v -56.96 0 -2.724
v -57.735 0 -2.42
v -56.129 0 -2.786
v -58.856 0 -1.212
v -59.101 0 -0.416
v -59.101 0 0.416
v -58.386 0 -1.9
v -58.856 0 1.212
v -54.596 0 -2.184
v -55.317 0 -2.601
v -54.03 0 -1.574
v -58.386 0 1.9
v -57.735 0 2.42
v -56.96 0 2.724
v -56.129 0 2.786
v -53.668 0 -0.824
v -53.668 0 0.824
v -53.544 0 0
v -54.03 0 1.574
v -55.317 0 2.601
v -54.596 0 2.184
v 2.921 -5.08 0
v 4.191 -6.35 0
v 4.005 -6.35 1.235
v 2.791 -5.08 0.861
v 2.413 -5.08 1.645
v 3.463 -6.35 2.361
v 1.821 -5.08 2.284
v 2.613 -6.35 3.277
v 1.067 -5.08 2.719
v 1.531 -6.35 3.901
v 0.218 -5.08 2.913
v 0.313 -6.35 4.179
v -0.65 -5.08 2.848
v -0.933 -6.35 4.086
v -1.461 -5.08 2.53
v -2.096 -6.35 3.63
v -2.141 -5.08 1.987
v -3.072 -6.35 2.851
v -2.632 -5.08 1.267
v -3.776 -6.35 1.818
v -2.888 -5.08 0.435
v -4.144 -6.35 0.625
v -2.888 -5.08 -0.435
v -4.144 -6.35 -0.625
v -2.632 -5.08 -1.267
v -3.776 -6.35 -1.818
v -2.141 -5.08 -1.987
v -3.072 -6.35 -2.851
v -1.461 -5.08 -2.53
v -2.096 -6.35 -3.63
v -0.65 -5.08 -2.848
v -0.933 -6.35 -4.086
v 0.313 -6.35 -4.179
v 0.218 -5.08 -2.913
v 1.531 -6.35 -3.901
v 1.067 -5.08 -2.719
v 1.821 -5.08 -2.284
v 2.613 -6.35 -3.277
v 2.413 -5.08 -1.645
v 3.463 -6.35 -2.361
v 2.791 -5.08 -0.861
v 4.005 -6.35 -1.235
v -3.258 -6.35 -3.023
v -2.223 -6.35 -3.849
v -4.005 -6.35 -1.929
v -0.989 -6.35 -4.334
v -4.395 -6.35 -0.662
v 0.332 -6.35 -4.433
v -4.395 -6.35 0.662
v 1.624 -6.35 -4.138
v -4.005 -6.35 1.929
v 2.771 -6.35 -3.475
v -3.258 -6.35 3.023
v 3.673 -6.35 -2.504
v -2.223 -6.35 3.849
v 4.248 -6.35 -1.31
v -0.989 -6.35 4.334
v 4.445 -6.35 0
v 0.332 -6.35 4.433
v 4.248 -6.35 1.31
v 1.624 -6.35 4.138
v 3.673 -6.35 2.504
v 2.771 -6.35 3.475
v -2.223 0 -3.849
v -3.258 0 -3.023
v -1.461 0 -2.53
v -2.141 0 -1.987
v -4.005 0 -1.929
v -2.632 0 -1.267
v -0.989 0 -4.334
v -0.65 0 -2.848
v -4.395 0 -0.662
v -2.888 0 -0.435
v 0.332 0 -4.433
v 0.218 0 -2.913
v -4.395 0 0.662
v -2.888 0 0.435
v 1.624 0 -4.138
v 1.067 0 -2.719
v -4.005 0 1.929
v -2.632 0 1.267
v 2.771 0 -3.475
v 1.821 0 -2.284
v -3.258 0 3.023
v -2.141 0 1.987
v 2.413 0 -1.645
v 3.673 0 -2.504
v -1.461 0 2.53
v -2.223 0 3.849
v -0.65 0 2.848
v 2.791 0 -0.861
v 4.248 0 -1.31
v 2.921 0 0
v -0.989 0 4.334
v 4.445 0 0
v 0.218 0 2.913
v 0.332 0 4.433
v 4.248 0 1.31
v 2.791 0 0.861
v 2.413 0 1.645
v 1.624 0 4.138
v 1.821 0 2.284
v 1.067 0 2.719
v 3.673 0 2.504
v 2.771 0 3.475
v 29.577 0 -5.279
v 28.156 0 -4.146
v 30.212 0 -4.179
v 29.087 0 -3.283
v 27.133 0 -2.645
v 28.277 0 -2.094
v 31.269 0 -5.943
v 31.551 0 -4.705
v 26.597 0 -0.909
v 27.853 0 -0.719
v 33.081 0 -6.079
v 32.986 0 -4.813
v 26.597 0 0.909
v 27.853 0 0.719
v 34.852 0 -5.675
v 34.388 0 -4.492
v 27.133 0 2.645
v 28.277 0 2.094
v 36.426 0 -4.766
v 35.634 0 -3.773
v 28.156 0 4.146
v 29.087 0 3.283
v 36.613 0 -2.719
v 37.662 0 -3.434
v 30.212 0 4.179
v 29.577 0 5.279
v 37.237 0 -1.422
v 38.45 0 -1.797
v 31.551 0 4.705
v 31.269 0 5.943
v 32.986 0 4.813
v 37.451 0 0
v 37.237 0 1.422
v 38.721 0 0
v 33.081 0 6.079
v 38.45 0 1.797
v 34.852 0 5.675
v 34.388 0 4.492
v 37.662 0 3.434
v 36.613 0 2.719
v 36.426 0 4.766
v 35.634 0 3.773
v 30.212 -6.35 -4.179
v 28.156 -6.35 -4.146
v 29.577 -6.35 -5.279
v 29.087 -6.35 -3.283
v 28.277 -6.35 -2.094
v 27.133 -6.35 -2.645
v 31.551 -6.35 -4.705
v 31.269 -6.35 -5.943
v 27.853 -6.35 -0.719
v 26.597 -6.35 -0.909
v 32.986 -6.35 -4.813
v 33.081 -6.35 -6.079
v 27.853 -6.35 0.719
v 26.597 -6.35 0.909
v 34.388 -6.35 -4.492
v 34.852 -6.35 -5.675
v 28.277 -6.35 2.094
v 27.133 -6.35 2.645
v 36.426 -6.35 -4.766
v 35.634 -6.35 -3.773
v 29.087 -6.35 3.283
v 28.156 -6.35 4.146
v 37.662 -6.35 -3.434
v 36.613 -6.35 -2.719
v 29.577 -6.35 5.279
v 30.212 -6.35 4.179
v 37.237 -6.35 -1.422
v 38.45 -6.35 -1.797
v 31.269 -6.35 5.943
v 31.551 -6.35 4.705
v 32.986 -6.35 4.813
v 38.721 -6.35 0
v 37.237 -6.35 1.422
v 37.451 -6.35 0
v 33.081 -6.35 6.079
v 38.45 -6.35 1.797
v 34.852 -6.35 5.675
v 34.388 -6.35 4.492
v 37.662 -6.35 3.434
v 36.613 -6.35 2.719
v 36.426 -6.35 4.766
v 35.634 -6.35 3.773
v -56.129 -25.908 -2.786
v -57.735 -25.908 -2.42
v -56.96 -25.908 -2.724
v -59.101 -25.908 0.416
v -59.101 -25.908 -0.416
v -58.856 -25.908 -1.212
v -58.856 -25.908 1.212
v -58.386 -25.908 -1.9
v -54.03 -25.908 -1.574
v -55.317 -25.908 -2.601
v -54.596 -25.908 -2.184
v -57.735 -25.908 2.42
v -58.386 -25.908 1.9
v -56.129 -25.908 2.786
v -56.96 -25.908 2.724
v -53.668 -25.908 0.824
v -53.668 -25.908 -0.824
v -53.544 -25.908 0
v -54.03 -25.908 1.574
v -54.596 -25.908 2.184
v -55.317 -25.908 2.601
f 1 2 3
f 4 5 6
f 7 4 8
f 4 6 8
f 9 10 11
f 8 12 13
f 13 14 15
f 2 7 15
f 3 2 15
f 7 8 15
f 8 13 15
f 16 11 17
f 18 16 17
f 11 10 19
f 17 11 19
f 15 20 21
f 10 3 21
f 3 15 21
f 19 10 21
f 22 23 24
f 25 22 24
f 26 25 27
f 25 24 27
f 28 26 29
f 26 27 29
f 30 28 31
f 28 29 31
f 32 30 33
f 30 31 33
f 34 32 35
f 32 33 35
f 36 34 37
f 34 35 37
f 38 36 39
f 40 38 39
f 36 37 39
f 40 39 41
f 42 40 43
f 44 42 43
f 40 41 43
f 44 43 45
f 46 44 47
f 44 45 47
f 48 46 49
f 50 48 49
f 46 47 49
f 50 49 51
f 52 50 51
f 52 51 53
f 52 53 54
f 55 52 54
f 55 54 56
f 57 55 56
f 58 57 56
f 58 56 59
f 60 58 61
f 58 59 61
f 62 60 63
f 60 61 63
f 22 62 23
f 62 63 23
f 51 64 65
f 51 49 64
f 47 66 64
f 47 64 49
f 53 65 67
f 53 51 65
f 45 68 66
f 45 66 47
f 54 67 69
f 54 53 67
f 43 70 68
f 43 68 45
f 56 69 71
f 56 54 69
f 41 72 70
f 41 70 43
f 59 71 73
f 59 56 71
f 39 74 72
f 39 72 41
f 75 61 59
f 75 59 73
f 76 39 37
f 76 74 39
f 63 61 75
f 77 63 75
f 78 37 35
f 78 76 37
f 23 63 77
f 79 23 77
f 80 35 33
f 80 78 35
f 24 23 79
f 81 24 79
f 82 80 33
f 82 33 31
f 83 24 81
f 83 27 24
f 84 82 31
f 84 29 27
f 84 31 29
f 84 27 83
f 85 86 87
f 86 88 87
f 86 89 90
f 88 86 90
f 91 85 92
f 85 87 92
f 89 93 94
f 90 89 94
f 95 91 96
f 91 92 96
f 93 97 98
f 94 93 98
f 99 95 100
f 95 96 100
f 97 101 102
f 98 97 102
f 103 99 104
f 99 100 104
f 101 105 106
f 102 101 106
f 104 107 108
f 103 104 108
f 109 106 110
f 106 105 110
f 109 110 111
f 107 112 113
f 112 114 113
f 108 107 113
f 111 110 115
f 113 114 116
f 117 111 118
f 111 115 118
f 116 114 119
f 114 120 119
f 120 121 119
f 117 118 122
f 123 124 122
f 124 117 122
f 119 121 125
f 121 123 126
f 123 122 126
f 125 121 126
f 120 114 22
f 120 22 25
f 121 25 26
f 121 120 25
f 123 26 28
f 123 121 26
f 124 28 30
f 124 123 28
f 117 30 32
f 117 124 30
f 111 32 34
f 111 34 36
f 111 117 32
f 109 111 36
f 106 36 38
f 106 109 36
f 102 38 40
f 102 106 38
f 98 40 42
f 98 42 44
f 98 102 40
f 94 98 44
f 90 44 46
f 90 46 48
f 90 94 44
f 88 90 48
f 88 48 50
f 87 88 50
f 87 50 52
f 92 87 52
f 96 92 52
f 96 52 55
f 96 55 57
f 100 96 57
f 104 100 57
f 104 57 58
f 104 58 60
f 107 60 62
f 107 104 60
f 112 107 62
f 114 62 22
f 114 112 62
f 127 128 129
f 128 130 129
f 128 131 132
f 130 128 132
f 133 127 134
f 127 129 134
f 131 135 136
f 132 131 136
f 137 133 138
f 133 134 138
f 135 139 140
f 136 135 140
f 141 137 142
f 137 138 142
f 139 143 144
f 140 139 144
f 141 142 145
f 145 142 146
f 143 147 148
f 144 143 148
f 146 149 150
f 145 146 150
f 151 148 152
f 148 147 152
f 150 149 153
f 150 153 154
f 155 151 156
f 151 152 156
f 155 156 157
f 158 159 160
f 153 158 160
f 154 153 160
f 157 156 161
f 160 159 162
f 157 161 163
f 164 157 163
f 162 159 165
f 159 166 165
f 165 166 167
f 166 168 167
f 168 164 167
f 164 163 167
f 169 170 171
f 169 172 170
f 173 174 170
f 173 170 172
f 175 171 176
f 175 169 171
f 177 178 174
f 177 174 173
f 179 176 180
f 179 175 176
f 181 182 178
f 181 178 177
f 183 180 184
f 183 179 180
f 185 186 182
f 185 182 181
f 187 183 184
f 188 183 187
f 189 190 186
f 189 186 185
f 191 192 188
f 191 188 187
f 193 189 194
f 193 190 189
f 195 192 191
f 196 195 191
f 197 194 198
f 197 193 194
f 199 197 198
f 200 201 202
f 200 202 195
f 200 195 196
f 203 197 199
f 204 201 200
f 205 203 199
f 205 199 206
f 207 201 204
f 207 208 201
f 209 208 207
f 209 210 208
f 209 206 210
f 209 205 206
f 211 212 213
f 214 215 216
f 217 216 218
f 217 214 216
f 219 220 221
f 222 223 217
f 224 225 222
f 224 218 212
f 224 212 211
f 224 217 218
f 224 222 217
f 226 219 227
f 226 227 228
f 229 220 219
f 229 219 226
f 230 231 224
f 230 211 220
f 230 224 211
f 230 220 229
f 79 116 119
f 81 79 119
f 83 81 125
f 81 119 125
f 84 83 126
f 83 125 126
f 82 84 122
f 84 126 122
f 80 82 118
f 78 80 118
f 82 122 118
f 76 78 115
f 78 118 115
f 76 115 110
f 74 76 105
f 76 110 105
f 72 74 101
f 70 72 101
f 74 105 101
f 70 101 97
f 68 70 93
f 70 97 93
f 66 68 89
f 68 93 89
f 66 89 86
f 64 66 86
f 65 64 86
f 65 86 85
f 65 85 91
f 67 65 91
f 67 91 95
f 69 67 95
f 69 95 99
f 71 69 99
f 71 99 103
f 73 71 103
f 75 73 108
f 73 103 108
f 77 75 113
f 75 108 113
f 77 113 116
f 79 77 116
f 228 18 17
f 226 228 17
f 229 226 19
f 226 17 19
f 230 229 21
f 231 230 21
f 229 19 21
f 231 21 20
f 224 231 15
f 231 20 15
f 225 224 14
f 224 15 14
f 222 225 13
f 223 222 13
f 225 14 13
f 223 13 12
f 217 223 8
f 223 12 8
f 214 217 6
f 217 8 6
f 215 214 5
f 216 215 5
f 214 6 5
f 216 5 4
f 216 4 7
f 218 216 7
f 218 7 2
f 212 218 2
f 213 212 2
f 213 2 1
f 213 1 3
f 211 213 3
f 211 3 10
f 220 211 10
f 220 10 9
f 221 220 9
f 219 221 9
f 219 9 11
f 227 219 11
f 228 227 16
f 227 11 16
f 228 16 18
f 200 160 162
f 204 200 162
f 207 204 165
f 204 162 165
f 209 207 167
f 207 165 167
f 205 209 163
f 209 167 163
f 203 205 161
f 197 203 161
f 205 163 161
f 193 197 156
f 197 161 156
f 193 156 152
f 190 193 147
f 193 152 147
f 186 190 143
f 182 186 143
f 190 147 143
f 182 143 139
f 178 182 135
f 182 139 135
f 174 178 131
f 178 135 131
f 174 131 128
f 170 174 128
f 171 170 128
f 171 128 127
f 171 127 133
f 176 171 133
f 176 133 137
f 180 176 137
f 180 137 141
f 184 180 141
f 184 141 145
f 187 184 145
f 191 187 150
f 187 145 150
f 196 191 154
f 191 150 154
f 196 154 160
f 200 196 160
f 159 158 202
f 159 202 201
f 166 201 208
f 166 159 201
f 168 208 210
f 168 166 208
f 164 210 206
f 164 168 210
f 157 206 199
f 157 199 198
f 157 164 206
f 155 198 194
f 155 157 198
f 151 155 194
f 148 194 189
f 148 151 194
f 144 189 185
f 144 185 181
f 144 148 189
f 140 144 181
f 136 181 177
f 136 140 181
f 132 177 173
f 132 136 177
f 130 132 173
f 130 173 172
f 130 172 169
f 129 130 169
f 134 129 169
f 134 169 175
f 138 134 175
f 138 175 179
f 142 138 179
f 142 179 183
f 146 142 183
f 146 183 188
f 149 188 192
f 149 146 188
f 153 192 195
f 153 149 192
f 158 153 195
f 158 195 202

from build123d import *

# Parameters (mm, degrees)
F0_R     = 4.445
F0_R_2   = 2.921
F1_DEPTH = 6.35
F2_R     = 6.096
F2_R_2   = 4.826
F3_DEPTH = 6.35
F4_SIZE  = 1.27
F5_R     = 2.794
F6_DEPTH = 25.908


with BuildPart() as f1:
    # F0 (on Front) → F1 (new body)
    with BuildSketch(Plane.XZ):
        Circle(F0_R)
        Circle(F0_R_2, mode=Mode.SUBTRACT)
    extrude(amount=F1_DEPTH)

    # F4
    f4_edges = [f1.edges().sort_by_distance(p)[0] for p in [
        (-2.921, -6.35, 0),
    ]]
    chamfer(f4_edges, length=F4_SIZE)


with BuildPart() as f3:
    # F2 (on Front) → F3 (new body)
    with BuildSketch(Plane.XZ):
        with Locations((32.62512, 0)):
            Circle(F2_R)
        with Locations((32.62512, 0)):
            Circle(F2_R_2, mode=Mode.SUBTRACT)
    extrude(amount=F3_DEPTH)


with BuildPart() as f6:
    # F5 (on Front) → F6 (new body)
    with BuildSketch(Plane.XZ):
        with Locations((-56.338213, 0)):
            Circle(F5_R)
    extrude(amount=F6_DEPTH)


solid = Compound([f1.part, f3.part, f6.part])
